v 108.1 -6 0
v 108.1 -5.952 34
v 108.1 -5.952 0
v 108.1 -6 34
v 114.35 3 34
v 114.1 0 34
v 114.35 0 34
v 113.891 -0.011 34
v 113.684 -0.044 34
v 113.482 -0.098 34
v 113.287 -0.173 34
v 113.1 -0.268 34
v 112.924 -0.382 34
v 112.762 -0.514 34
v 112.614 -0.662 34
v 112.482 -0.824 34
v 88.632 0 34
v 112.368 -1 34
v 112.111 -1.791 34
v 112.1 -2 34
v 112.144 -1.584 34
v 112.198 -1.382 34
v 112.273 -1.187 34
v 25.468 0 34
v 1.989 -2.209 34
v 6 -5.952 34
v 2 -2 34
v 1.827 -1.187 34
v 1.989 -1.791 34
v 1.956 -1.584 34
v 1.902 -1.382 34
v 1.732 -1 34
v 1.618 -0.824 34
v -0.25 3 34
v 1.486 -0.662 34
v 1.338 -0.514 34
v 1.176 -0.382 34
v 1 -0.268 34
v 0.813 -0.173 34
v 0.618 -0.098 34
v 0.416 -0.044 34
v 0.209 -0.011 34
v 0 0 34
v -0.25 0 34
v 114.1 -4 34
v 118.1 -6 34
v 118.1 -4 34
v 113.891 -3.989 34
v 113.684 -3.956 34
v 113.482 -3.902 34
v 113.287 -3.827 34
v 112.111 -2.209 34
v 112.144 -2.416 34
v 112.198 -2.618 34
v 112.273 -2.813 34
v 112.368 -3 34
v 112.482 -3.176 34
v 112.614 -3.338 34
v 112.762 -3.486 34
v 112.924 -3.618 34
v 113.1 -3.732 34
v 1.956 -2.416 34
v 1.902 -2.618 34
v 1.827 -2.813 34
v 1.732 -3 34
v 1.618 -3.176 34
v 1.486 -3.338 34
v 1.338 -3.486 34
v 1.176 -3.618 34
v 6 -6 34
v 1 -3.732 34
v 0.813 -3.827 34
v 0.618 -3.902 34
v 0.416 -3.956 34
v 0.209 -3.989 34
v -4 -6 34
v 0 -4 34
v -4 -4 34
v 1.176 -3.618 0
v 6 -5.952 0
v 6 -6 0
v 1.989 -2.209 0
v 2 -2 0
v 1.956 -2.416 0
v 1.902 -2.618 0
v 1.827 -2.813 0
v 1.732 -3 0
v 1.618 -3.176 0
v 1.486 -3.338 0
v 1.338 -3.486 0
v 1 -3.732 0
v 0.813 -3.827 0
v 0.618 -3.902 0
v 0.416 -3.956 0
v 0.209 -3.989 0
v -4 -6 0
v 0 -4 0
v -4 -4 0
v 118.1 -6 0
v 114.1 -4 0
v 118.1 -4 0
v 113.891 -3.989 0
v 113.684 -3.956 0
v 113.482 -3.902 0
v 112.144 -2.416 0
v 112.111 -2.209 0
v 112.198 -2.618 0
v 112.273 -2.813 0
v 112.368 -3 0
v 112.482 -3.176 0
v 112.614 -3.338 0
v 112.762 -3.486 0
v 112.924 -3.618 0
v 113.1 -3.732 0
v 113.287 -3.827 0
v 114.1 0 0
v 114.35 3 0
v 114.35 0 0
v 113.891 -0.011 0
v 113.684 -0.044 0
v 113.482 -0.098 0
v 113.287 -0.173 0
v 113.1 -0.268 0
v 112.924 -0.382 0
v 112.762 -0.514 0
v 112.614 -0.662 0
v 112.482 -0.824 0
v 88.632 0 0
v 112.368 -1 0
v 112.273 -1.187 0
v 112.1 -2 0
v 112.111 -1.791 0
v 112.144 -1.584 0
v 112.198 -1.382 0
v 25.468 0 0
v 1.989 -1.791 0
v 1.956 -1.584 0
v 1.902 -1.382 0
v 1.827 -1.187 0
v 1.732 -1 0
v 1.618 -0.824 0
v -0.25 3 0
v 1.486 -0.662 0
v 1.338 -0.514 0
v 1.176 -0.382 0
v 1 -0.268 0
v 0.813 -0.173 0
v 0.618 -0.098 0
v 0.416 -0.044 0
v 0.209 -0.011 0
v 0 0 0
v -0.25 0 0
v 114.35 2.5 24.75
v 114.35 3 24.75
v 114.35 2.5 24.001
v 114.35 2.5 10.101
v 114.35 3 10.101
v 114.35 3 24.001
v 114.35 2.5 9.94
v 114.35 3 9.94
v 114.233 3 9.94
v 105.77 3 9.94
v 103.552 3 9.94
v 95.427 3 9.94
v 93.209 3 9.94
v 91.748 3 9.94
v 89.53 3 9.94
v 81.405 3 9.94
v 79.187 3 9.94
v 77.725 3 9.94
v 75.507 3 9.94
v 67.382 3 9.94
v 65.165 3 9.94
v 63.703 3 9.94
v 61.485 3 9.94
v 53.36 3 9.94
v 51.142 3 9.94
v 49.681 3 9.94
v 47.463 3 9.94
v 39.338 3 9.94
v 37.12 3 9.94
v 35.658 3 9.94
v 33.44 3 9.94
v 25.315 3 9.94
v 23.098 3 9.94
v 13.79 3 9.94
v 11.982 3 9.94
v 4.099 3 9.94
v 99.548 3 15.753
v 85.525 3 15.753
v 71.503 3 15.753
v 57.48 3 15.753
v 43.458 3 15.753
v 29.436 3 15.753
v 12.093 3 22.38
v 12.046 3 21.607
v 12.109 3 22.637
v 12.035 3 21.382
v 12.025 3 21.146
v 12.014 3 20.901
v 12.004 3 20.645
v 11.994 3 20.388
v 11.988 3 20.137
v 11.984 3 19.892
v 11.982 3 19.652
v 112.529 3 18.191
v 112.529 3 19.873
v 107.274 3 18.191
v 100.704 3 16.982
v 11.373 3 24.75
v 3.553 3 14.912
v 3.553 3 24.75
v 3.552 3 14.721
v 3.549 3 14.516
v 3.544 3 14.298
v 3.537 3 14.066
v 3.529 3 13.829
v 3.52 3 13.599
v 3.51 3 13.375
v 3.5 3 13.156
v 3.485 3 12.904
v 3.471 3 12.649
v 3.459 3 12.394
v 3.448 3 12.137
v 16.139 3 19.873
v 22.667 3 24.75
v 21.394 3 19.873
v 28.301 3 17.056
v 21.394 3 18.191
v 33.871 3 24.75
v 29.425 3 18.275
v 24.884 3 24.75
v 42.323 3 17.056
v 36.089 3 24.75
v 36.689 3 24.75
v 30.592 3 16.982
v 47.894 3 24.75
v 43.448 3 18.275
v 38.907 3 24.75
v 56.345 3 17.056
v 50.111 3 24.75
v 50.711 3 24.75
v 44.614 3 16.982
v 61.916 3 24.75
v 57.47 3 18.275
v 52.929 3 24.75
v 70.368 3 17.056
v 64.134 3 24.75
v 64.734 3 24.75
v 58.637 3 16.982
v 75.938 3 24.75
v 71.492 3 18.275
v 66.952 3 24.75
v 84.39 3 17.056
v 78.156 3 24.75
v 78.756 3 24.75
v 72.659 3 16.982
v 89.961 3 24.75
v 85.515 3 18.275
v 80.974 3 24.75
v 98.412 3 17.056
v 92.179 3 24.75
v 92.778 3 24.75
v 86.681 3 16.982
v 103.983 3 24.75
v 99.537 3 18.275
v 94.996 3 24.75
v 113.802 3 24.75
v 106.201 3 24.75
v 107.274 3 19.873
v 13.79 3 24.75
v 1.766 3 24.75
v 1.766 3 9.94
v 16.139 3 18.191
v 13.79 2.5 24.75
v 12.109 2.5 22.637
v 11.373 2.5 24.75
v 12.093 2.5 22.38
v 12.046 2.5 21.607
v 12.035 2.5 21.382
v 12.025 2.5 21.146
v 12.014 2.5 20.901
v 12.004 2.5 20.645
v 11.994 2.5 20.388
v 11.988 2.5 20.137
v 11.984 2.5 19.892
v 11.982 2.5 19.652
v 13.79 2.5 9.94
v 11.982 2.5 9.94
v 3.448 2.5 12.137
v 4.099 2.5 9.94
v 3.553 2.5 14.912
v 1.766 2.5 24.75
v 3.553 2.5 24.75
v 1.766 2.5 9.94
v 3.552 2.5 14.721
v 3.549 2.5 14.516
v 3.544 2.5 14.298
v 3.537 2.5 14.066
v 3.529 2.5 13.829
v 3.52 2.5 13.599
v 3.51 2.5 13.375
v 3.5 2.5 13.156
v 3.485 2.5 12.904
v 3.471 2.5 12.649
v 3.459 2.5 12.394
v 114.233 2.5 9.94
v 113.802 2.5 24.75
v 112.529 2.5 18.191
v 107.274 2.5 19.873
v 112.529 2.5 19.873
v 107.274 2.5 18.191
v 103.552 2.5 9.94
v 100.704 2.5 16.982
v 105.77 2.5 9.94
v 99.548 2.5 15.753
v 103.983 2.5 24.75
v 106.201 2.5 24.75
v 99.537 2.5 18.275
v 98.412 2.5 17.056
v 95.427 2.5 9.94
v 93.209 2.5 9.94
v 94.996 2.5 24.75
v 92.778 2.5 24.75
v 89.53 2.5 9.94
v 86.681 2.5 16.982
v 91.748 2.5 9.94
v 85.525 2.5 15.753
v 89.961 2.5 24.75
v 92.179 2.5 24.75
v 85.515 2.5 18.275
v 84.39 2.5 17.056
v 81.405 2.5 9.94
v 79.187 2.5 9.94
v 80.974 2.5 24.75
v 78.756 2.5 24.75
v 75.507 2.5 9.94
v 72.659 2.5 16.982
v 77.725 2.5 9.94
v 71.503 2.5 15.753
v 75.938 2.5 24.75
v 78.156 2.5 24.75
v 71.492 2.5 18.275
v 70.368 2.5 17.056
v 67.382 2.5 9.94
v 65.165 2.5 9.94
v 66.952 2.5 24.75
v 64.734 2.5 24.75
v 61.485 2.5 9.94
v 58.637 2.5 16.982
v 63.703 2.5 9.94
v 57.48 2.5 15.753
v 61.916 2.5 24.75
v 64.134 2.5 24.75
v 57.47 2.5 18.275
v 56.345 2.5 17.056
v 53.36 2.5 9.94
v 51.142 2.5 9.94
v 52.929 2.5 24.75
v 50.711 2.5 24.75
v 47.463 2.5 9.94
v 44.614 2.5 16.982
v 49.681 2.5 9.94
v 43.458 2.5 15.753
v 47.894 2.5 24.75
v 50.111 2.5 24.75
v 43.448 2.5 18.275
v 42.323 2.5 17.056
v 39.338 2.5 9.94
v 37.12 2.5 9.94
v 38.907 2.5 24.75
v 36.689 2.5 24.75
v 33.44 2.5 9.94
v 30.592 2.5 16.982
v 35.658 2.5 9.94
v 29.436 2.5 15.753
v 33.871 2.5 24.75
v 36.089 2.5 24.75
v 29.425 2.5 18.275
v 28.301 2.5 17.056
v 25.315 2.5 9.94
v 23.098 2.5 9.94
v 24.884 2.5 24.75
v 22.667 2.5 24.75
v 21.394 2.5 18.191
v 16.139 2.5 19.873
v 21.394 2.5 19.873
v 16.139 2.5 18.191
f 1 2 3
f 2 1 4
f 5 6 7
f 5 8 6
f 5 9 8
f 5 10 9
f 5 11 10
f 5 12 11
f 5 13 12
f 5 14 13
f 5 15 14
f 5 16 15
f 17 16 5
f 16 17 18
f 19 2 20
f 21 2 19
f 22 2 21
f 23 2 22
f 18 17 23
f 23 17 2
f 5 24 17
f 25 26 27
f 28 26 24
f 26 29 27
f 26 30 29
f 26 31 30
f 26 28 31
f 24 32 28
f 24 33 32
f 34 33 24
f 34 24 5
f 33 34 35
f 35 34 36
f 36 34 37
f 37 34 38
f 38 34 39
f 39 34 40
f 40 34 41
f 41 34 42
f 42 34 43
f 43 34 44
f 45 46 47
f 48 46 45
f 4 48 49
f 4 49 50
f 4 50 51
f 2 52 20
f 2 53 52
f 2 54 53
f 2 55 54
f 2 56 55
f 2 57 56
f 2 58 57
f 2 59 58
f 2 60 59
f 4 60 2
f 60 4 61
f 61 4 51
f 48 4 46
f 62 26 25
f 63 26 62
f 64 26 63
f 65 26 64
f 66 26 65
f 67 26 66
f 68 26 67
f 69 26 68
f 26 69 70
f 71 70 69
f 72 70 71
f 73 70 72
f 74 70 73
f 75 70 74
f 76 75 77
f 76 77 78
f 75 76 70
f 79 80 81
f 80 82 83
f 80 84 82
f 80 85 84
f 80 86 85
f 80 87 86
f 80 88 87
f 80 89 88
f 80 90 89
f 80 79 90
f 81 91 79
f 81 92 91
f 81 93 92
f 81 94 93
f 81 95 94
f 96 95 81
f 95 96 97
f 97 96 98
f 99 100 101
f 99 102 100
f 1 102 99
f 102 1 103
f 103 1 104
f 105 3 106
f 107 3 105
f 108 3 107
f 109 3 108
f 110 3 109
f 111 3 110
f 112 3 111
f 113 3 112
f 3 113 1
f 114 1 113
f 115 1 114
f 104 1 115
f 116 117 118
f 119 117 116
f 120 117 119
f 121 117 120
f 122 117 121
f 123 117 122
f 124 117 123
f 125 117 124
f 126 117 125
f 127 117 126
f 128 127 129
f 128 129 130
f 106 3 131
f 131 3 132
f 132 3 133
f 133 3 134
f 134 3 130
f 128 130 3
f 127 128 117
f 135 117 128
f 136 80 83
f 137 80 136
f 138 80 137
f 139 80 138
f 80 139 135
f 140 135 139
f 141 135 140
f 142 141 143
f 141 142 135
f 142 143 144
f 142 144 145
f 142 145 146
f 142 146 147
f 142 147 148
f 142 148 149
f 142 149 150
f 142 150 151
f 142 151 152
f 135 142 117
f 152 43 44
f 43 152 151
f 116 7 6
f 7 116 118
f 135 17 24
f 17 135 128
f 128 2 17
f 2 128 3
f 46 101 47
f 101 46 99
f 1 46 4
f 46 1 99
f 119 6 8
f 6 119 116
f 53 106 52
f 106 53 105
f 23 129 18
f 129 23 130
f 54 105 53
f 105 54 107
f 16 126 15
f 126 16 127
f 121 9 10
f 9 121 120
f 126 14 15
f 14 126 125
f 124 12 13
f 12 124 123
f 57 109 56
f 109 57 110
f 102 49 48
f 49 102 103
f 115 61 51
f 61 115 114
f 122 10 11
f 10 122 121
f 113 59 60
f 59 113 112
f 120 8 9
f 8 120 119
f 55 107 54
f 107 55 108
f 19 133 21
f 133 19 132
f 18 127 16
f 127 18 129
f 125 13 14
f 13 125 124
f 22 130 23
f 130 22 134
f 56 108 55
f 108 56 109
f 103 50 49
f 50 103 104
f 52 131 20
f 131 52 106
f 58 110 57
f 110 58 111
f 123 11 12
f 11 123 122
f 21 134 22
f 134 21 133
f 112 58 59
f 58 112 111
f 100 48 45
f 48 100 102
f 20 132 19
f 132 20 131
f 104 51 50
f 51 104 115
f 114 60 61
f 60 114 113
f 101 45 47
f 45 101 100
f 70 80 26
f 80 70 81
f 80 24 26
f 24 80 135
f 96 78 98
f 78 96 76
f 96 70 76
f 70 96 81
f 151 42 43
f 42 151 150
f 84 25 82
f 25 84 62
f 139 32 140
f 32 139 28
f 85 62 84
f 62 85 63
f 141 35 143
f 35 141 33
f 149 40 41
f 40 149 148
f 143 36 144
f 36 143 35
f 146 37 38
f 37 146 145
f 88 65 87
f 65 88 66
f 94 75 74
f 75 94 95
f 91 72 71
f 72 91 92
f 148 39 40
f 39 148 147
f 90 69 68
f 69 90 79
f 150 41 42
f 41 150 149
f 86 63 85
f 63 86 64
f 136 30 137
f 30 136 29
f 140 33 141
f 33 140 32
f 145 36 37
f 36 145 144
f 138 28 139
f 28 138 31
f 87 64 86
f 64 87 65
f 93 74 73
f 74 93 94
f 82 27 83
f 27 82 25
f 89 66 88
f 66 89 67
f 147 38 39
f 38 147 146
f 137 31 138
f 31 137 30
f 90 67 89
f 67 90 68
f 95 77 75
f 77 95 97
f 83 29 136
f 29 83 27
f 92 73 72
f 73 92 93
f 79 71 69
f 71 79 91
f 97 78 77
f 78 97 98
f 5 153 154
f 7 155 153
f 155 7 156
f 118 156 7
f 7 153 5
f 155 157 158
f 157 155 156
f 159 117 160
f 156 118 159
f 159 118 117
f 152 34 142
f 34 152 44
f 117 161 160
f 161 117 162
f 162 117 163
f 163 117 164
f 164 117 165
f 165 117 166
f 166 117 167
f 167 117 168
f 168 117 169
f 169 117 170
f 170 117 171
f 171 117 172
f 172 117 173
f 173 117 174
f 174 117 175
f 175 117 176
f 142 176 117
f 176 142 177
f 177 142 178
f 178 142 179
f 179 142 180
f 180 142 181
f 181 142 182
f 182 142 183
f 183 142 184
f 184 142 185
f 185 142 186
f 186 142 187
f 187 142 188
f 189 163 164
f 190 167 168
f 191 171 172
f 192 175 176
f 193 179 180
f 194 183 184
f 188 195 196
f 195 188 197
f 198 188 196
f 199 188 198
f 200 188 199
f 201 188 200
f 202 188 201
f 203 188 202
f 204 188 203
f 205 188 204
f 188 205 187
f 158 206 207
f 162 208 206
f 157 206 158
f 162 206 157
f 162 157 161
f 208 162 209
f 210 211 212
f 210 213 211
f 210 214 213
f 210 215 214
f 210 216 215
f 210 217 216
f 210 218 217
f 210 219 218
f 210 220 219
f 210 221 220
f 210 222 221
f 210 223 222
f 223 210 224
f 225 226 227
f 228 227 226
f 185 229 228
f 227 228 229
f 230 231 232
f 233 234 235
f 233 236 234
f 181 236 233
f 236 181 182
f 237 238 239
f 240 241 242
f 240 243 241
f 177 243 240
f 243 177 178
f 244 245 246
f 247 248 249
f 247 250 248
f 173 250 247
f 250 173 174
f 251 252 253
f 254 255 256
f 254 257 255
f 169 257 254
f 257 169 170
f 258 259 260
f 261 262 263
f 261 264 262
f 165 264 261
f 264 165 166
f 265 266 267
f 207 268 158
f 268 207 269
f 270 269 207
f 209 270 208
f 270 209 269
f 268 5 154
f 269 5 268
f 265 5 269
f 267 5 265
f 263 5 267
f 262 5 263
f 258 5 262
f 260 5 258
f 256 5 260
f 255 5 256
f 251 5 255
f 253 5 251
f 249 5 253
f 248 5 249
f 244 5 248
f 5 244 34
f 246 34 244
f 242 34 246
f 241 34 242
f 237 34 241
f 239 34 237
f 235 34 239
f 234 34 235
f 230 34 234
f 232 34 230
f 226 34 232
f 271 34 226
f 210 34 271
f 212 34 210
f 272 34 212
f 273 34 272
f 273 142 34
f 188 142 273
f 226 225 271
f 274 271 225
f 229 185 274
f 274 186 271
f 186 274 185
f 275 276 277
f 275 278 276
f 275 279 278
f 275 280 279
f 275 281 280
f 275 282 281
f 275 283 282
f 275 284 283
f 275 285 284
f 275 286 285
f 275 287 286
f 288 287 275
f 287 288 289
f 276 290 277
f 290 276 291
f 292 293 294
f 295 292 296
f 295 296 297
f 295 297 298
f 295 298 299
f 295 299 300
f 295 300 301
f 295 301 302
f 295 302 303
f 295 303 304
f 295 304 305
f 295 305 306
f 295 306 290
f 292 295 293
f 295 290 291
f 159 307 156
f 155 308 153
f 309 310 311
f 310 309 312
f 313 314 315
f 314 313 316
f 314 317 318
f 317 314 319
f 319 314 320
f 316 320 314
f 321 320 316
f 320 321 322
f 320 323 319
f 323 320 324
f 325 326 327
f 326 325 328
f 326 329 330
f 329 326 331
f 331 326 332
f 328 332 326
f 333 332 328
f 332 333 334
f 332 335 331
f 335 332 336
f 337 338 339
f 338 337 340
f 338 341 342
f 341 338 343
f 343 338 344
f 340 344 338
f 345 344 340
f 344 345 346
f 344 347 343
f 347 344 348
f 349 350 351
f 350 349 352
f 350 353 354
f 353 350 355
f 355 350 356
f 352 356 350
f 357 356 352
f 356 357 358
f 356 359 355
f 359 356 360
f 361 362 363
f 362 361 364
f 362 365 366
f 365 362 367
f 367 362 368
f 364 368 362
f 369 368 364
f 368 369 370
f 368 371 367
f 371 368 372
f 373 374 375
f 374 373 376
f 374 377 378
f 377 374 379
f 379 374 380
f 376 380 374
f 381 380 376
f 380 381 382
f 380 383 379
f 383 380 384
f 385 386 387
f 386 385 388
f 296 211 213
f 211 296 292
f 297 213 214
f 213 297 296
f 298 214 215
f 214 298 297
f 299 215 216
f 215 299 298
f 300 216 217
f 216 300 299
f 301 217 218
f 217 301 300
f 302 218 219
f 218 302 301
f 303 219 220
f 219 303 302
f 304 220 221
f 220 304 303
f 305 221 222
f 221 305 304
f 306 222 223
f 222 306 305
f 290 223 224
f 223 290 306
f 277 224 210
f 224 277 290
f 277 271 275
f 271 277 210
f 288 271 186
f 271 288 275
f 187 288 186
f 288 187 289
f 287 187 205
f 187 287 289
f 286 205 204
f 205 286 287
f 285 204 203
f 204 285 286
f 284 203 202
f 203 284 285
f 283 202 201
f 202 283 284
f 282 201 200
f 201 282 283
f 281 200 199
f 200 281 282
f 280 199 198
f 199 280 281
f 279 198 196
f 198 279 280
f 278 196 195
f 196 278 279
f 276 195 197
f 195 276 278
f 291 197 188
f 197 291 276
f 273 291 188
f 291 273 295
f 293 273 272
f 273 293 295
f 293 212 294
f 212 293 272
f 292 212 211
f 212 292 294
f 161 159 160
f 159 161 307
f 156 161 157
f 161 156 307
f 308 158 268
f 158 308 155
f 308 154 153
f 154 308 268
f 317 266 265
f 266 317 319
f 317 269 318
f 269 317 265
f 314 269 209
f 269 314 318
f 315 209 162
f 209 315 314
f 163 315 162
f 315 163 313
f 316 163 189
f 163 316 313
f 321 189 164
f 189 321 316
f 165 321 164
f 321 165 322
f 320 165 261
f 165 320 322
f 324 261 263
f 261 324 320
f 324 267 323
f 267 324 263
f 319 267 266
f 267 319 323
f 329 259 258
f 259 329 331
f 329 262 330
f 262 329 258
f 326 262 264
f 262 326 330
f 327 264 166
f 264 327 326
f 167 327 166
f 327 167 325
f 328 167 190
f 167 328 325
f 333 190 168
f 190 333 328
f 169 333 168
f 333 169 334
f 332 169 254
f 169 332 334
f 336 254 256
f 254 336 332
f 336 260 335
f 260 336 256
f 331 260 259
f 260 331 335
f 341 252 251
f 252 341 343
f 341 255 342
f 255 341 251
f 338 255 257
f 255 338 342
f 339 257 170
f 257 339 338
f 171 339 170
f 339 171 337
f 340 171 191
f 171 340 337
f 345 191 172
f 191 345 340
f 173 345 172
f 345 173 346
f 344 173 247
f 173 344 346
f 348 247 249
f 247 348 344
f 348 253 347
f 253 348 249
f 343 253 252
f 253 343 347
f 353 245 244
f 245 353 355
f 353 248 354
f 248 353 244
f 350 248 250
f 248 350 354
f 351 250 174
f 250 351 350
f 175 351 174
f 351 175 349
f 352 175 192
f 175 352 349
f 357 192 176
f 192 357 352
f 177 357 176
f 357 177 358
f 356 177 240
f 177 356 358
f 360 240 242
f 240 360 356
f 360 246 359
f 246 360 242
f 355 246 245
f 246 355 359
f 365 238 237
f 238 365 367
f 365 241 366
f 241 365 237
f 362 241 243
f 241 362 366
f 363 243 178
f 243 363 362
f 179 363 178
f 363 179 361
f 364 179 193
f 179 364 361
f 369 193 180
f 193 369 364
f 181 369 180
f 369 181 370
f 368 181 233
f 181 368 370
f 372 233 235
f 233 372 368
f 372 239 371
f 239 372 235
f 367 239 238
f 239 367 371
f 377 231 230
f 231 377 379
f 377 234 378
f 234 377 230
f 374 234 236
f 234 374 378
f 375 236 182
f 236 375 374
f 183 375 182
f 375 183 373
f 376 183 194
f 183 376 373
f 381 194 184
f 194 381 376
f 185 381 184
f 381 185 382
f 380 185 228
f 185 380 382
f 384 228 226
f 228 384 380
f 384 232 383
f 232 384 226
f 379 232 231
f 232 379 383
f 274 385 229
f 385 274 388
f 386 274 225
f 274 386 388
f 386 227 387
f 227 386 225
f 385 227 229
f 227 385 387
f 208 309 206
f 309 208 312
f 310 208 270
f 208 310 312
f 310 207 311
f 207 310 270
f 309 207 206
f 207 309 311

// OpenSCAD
module copy_mirror(vec=[0,1,0])
{
    children();
    mirror(vec) children();
}

wire_dia = 4;
width = 118.10 - wire_dia;
thickness = 3;
height = 34;
overhang = .25;
text_size = 15.5;
difference(){
    union(){
translate([-overhang,0,0]){
    //main body
cube([width + overhang * 2,thickness,height]);
}
//ramp / hole
translate([width / 2, - (wire_dia / 2) ,-.5]){
copy_mirror([1,0,0]){
translate([width / 2, 0, 0]){
difference(){
translate([-6,-(6 - wire_dia/2),.5]){
cube([10,6,height]);
translate([-20,0,0]){
difference(){    
cube([20,6,height]);
translate([-2,.5,-.5]){
rotate([0,0,-17]){
cube([25,6,height + 1]);
}
}
}
}
}
cylinder(d=wire_dia,h=height + 1, $fn=60);
translate([0,-(wire_dia/2),0]){
cube([10,wire_dia +1,height +1]);
}
}
}
}
}
}

rotate([-90,0,0]){
translate([0,-(text_size + (height-text_size)/2) ,thickness - .5]){
linear_extrude(1)
text("N-XXXXXX-X", size = text_size);
}
}
}
